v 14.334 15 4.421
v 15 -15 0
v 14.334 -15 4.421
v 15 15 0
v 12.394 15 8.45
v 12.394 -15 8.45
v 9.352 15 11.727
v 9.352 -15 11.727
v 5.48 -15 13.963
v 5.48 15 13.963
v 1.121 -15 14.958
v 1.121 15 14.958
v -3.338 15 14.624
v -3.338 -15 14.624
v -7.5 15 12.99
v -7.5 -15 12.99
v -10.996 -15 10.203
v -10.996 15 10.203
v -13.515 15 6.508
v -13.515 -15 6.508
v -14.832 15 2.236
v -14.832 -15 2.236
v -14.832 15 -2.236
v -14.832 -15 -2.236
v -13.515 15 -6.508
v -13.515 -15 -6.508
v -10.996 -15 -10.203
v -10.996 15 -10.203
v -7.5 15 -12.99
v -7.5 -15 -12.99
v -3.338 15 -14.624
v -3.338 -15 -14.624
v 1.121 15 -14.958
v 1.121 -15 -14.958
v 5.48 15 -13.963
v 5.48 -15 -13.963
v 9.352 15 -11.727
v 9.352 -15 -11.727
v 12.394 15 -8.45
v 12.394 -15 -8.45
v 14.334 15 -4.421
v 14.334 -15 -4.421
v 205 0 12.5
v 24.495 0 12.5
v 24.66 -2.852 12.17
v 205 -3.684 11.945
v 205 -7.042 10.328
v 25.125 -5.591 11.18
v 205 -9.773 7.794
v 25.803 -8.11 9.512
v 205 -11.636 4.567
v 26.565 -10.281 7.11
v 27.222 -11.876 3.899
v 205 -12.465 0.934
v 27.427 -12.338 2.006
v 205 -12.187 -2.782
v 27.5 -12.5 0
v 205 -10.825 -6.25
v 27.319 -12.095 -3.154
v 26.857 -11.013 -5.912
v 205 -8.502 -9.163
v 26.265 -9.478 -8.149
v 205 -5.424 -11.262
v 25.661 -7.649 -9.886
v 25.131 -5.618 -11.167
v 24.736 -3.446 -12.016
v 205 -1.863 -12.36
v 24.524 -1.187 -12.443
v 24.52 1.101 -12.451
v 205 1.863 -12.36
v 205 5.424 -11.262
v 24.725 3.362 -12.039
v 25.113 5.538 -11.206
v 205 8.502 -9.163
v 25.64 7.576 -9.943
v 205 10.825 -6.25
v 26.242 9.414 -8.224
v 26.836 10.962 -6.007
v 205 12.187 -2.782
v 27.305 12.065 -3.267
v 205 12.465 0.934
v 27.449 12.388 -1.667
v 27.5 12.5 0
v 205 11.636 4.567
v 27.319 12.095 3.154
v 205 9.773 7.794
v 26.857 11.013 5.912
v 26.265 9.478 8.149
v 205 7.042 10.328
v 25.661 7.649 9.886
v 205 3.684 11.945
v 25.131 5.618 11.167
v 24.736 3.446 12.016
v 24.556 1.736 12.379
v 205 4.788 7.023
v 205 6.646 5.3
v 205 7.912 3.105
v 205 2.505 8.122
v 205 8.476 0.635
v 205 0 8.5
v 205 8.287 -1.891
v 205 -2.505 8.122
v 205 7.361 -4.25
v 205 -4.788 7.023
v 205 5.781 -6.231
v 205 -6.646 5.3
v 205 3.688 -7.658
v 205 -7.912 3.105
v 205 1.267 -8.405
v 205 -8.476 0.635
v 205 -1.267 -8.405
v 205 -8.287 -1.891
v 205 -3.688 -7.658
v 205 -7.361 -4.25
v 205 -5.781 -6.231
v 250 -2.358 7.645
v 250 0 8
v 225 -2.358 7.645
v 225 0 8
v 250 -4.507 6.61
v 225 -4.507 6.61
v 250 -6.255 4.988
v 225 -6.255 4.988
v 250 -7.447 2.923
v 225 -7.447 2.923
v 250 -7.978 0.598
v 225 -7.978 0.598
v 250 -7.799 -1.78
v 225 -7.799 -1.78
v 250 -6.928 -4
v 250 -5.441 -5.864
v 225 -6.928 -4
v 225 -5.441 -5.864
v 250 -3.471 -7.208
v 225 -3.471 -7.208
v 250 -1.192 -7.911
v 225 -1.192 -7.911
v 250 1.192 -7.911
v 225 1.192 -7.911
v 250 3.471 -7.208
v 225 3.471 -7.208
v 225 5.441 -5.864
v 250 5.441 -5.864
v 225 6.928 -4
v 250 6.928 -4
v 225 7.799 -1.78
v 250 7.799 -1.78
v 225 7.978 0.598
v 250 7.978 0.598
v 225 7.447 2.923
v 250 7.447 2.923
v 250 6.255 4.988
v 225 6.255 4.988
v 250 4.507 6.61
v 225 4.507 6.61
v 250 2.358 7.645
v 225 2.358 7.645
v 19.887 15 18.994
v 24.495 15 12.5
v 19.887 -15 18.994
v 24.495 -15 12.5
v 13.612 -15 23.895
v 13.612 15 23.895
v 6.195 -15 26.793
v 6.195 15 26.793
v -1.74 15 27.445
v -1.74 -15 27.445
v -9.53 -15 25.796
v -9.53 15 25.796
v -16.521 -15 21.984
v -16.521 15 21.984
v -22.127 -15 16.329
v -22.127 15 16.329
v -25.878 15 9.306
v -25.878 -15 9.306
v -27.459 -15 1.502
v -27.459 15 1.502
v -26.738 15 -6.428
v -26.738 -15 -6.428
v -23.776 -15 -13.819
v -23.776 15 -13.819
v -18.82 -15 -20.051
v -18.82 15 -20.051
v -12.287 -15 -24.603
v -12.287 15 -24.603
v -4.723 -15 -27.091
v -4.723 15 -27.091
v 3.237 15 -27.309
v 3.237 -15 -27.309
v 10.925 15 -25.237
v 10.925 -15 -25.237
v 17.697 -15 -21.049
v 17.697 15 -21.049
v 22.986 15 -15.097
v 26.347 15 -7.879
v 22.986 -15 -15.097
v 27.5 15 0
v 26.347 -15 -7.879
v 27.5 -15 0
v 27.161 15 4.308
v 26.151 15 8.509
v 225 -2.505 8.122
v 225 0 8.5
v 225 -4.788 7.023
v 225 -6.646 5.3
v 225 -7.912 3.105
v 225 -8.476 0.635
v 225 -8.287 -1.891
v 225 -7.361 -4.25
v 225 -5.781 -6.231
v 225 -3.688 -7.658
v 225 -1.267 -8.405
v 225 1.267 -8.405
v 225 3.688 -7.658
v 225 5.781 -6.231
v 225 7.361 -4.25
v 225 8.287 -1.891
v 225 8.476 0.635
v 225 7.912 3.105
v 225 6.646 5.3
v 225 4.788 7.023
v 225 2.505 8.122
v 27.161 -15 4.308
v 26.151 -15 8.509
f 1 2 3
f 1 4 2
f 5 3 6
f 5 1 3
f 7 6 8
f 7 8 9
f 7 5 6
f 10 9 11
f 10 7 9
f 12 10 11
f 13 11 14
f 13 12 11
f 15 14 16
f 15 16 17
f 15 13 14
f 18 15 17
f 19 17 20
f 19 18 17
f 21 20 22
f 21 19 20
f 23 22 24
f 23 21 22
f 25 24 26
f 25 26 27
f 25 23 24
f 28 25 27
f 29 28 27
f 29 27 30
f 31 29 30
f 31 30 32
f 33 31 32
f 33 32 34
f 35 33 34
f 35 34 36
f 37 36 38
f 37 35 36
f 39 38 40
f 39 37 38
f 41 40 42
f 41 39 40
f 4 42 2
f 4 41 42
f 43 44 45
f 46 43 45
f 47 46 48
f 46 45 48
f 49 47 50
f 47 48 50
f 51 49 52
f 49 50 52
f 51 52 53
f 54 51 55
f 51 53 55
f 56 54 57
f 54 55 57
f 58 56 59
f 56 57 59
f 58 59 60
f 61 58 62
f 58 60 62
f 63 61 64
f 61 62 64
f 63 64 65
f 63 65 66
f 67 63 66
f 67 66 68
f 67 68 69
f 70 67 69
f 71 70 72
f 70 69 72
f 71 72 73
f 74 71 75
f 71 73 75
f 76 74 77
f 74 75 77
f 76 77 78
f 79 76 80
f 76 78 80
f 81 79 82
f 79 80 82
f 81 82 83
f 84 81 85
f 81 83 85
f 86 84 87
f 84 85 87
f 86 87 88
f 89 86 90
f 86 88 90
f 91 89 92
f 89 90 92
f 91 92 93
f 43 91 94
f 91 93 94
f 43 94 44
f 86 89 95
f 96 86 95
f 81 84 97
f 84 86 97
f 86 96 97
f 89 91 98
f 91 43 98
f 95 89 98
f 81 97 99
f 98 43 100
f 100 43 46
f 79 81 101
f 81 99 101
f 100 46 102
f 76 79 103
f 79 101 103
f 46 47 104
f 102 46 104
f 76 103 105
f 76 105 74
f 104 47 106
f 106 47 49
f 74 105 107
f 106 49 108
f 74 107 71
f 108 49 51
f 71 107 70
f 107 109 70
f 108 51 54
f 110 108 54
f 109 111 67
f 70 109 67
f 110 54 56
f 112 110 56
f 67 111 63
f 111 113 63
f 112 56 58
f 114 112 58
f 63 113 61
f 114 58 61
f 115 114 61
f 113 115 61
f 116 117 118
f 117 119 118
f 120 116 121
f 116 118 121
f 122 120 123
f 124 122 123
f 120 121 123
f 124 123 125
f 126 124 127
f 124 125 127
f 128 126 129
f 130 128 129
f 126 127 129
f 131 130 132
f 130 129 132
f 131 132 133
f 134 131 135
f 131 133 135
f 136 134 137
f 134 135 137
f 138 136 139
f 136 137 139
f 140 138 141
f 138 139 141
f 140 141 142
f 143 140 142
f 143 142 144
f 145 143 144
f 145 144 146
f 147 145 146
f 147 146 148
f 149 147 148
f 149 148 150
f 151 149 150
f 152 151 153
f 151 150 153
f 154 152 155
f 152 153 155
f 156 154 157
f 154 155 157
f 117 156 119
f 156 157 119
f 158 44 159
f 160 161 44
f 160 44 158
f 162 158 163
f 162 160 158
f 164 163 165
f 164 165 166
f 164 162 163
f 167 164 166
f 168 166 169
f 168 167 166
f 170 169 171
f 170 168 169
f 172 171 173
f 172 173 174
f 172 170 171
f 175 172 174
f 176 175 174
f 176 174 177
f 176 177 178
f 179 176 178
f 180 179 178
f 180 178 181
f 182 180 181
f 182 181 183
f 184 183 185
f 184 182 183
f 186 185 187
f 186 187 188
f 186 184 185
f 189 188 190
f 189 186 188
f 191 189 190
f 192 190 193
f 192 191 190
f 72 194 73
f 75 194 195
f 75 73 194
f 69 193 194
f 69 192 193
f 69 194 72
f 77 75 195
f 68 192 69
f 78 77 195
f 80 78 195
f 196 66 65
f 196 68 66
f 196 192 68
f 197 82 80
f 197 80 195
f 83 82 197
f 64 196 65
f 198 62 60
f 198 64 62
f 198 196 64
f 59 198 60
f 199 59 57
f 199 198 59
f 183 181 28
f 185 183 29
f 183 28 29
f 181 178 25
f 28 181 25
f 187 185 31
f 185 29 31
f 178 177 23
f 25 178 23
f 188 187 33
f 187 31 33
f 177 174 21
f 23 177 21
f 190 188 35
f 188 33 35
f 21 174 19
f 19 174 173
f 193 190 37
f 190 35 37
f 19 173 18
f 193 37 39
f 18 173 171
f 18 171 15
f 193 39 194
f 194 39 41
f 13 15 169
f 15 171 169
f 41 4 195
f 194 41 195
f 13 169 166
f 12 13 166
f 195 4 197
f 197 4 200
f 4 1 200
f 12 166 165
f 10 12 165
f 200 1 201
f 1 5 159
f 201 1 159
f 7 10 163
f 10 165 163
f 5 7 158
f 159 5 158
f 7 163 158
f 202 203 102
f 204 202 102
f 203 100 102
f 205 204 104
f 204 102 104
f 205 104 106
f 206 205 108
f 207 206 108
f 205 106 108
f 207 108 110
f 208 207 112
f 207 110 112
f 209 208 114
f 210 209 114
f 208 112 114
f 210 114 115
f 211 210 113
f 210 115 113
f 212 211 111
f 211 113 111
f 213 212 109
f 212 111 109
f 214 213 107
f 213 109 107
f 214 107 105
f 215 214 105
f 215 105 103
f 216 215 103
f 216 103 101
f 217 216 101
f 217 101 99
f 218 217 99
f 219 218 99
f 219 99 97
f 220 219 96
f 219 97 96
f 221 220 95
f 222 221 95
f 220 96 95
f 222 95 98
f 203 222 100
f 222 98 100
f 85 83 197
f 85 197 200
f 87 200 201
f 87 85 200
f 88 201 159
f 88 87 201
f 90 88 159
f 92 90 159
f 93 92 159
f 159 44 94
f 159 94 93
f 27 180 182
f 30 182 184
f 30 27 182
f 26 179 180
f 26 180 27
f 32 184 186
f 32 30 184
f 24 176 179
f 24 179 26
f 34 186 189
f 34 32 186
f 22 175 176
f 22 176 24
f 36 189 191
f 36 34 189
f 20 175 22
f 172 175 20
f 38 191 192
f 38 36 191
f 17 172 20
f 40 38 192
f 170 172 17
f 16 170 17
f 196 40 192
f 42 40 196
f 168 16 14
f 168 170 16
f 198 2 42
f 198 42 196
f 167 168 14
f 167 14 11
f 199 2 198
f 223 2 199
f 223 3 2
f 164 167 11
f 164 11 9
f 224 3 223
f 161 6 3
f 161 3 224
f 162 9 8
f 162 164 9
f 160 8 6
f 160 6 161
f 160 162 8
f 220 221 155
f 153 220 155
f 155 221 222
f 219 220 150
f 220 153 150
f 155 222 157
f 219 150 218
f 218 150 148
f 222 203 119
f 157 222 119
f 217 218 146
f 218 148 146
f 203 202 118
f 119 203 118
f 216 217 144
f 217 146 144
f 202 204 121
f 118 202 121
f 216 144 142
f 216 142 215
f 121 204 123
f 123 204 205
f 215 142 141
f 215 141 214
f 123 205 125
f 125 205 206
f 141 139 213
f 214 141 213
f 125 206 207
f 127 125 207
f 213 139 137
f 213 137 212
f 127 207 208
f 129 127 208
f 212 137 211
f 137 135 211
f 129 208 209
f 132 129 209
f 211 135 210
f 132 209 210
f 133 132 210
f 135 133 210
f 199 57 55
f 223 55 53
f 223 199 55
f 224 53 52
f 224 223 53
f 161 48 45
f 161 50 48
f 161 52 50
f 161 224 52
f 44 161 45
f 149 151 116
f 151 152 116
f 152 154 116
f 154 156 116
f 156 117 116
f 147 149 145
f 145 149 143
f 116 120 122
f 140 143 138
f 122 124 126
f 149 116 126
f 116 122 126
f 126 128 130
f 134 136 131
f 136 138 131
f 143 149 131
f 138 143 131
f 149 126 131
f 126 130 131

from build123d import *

# Parameters (mm, degrees)
F0_R     = 15
F3_DEPTH = 15


with BuildPart() as f2:
    # F0 (on Front) → F2 (revolve)
    with BuildSketch(Plane.XZ):
        with BuildLine():
            ThreePointArc((24.494897, 12.5), (26.738172, 6.428076), (27.5, 0))
            Line((27.5, 0), (250, 0))
            Line((250, 0), (250, 8))
            Line((250, 8), (225, 8))
            Line((225, 8), (225, 8.5))
            Line((225, 8.5), (205, 8.5))
            Line((205, 8.5), (205, 12.5))
            Line((205, 12.5), (24.494897, 12.5))
        make_face()
    revolve(axis=Axis((125.488594, 0, 0), (1, 0, 0)))

    # F0 (on Front) → F3 (join, symmetric)
    with BuildSketch(Plane.XZ):
        with BuildLine():
            ThreePointArc((24.494897, 12.5), (-26.738172, -6.428076), (27.5, 0))
            ThreePointArc((27.5, 0), (26.738172, 6.428076), (24.494897, 12.5))
        make_face()
        Circle(F0_R, mode=Mode.SUBTRACT)
    extrude(amount=F3_DEPTH, both=True)


solid = f2.part
